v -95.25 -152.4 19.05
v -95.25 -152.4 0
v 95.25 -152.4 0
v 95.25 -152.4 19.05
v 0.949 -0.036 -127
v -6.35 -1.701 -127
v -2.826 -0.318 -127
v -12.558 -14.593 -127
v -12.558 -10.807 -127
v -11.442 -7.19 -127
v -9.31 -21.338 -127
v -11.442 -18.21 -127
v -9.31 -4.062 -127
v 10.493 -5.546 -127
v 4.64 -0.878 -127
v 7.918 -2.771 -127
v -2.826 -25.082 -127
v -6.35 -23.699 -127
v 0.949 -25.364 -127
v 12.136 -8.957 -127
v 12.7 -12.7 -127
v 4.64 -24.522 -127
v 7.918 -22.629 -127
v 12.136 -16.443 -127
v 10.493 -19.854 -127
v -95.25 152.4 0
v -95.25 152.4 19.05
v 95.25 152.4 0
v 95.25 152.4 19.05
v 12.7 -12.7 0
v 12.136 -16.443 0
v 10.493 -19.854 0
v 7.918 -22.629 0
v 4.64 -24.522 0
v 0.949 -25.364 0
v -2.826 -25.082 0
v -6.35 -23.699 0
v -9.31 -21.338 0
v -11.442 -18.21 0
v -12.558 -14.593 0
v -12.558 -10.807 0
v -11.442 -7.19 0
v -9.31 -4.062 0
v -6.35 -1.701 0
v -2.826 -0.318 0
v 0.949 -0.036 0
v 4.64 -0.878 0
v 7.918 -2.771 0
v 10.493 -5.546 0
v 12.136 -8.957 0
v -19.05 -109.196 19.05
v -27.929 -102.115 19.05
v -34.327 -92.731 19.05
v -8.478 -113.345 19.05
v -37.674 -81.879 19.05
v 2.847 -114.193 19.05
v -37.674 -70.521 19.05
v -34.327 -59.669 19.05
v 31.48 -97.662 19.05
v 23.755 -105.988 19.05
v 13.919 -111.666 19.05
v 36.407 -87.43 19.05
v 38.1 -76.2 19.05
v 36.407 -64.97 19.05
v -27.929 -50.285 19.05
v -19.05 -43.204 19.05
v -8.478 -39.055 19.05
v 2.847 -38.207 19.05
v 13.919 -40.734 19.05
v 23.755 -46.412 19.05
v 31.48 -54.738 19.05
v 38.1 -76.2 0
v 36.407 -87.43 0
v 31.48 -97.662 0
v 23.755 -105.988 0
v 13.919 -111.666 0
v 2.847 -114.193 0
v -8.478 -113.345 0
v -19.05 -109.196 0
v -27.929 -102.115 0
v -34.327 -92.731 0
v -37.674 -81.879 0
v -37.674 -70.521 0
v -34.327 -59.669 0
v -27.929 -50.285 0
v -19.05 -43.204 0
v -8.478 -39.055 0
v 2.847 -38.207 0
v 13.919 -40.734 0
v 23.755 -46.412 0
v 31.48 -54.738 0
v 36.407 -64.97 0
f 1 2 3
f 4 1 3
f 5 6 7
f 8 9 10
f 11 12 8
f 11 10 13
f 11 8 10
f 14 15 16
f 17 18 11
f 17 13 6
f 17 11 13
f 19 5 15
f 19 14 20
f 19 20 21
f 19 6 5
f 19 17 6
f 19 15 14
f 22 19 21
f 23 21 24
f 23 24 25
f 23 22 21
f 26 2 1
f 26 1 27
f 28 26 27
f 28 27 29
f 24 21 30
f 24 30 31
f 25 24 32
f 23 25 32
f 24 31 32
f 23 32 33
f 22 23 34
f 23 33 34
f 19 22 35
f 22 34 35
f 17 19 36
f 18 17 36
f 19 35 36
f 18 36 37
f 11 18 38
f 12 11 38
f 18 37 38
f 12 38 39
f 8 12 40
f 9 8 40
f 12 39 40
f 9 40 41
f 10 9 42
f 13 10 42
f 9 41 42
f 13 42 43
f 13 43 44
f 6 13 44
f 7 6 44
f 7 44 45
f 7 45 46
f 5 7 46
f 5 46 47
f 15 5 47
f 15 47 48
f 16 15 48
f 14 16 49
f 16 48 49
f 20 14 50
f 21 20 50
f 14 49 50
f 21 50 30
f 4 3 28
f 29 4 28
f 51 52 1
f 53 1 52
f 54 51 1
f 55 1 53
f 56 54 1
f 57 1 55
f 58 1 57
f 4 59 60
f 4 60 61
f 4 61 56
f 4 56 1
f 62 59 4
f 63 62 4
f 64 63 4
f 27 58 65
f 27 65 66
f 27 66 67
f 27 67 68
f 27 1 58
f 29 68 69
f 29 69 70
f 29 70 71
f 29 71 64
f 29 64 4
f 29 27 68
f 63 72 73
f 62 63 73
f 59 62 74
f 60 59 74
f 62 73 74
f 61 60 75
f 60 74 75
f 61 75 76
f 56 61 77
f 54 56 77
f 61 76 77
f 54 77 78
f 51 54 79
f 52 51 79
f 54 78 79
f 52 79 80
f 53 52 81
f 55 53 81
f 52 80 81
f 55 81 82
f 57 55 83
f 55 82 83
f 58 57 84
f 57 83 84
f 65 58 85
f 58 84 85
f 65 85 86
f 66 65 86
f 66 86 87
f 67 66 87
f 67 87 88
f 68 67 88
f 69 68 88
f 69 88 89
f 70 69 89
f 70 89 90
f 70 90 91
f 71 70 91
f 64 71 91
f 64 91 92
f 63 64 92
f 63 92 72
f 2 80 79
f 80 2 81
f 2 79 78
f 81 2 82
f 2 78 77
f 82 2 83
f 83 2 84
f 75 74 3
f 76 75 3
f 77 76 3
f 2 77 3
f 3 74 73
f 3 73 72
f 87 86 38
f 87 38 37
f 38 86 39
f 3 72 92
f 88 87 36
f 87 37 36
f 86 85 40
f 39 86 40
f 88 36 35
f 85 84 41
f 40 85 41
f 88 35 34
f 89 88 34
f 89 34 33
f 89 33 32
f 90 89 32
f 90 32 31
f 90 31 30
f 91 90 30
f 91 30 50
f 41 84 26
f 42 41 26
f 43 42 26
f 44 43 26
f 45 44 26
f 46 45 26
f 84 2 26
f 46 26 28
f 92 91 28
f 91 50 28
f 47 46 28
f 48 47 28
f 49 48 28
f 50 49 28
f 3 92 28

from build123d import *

# Parameters (mm, degrees)
F0_W     = 190.5
F0_H     = 304.8
F1_DEPTH = 19.05
F2_R     = 38.1
F4_DEPTH = 25.4
F3_R     = 12.7
F5_DEPTH = 127


with BuildPart() as f1:
    # F0 (on Top) → F1 (new body)
    with BuildSketch(Plane.XY):
        Rectangle(F0_W, F0_H)
    extrude(amount=F1_DEPTH)

    # F2 (on face) → F4 (cut)
    with BuildSketch(Plane(origin=(0, 0, 0), x_dir=(1, 0, 0), z_dir=(0, 0, -1))):
        with Locations((0, 76.2)):
            Circle(F2_R)
    extrude(amount=-F4_DEPTH, mode=Mode.SUBTRACT)

    # F3 (on face) → F5 (join)
    with BuildSketch(Plane(origin=(0, 0, 0), x_dir=(1, 0, 0), z_dir=(0, 0, -1))):
        with Locations((0, 12.7)):
            Circle(F3_R)
    extrude(amount=F5_DEPTH)


solid = f1.part
